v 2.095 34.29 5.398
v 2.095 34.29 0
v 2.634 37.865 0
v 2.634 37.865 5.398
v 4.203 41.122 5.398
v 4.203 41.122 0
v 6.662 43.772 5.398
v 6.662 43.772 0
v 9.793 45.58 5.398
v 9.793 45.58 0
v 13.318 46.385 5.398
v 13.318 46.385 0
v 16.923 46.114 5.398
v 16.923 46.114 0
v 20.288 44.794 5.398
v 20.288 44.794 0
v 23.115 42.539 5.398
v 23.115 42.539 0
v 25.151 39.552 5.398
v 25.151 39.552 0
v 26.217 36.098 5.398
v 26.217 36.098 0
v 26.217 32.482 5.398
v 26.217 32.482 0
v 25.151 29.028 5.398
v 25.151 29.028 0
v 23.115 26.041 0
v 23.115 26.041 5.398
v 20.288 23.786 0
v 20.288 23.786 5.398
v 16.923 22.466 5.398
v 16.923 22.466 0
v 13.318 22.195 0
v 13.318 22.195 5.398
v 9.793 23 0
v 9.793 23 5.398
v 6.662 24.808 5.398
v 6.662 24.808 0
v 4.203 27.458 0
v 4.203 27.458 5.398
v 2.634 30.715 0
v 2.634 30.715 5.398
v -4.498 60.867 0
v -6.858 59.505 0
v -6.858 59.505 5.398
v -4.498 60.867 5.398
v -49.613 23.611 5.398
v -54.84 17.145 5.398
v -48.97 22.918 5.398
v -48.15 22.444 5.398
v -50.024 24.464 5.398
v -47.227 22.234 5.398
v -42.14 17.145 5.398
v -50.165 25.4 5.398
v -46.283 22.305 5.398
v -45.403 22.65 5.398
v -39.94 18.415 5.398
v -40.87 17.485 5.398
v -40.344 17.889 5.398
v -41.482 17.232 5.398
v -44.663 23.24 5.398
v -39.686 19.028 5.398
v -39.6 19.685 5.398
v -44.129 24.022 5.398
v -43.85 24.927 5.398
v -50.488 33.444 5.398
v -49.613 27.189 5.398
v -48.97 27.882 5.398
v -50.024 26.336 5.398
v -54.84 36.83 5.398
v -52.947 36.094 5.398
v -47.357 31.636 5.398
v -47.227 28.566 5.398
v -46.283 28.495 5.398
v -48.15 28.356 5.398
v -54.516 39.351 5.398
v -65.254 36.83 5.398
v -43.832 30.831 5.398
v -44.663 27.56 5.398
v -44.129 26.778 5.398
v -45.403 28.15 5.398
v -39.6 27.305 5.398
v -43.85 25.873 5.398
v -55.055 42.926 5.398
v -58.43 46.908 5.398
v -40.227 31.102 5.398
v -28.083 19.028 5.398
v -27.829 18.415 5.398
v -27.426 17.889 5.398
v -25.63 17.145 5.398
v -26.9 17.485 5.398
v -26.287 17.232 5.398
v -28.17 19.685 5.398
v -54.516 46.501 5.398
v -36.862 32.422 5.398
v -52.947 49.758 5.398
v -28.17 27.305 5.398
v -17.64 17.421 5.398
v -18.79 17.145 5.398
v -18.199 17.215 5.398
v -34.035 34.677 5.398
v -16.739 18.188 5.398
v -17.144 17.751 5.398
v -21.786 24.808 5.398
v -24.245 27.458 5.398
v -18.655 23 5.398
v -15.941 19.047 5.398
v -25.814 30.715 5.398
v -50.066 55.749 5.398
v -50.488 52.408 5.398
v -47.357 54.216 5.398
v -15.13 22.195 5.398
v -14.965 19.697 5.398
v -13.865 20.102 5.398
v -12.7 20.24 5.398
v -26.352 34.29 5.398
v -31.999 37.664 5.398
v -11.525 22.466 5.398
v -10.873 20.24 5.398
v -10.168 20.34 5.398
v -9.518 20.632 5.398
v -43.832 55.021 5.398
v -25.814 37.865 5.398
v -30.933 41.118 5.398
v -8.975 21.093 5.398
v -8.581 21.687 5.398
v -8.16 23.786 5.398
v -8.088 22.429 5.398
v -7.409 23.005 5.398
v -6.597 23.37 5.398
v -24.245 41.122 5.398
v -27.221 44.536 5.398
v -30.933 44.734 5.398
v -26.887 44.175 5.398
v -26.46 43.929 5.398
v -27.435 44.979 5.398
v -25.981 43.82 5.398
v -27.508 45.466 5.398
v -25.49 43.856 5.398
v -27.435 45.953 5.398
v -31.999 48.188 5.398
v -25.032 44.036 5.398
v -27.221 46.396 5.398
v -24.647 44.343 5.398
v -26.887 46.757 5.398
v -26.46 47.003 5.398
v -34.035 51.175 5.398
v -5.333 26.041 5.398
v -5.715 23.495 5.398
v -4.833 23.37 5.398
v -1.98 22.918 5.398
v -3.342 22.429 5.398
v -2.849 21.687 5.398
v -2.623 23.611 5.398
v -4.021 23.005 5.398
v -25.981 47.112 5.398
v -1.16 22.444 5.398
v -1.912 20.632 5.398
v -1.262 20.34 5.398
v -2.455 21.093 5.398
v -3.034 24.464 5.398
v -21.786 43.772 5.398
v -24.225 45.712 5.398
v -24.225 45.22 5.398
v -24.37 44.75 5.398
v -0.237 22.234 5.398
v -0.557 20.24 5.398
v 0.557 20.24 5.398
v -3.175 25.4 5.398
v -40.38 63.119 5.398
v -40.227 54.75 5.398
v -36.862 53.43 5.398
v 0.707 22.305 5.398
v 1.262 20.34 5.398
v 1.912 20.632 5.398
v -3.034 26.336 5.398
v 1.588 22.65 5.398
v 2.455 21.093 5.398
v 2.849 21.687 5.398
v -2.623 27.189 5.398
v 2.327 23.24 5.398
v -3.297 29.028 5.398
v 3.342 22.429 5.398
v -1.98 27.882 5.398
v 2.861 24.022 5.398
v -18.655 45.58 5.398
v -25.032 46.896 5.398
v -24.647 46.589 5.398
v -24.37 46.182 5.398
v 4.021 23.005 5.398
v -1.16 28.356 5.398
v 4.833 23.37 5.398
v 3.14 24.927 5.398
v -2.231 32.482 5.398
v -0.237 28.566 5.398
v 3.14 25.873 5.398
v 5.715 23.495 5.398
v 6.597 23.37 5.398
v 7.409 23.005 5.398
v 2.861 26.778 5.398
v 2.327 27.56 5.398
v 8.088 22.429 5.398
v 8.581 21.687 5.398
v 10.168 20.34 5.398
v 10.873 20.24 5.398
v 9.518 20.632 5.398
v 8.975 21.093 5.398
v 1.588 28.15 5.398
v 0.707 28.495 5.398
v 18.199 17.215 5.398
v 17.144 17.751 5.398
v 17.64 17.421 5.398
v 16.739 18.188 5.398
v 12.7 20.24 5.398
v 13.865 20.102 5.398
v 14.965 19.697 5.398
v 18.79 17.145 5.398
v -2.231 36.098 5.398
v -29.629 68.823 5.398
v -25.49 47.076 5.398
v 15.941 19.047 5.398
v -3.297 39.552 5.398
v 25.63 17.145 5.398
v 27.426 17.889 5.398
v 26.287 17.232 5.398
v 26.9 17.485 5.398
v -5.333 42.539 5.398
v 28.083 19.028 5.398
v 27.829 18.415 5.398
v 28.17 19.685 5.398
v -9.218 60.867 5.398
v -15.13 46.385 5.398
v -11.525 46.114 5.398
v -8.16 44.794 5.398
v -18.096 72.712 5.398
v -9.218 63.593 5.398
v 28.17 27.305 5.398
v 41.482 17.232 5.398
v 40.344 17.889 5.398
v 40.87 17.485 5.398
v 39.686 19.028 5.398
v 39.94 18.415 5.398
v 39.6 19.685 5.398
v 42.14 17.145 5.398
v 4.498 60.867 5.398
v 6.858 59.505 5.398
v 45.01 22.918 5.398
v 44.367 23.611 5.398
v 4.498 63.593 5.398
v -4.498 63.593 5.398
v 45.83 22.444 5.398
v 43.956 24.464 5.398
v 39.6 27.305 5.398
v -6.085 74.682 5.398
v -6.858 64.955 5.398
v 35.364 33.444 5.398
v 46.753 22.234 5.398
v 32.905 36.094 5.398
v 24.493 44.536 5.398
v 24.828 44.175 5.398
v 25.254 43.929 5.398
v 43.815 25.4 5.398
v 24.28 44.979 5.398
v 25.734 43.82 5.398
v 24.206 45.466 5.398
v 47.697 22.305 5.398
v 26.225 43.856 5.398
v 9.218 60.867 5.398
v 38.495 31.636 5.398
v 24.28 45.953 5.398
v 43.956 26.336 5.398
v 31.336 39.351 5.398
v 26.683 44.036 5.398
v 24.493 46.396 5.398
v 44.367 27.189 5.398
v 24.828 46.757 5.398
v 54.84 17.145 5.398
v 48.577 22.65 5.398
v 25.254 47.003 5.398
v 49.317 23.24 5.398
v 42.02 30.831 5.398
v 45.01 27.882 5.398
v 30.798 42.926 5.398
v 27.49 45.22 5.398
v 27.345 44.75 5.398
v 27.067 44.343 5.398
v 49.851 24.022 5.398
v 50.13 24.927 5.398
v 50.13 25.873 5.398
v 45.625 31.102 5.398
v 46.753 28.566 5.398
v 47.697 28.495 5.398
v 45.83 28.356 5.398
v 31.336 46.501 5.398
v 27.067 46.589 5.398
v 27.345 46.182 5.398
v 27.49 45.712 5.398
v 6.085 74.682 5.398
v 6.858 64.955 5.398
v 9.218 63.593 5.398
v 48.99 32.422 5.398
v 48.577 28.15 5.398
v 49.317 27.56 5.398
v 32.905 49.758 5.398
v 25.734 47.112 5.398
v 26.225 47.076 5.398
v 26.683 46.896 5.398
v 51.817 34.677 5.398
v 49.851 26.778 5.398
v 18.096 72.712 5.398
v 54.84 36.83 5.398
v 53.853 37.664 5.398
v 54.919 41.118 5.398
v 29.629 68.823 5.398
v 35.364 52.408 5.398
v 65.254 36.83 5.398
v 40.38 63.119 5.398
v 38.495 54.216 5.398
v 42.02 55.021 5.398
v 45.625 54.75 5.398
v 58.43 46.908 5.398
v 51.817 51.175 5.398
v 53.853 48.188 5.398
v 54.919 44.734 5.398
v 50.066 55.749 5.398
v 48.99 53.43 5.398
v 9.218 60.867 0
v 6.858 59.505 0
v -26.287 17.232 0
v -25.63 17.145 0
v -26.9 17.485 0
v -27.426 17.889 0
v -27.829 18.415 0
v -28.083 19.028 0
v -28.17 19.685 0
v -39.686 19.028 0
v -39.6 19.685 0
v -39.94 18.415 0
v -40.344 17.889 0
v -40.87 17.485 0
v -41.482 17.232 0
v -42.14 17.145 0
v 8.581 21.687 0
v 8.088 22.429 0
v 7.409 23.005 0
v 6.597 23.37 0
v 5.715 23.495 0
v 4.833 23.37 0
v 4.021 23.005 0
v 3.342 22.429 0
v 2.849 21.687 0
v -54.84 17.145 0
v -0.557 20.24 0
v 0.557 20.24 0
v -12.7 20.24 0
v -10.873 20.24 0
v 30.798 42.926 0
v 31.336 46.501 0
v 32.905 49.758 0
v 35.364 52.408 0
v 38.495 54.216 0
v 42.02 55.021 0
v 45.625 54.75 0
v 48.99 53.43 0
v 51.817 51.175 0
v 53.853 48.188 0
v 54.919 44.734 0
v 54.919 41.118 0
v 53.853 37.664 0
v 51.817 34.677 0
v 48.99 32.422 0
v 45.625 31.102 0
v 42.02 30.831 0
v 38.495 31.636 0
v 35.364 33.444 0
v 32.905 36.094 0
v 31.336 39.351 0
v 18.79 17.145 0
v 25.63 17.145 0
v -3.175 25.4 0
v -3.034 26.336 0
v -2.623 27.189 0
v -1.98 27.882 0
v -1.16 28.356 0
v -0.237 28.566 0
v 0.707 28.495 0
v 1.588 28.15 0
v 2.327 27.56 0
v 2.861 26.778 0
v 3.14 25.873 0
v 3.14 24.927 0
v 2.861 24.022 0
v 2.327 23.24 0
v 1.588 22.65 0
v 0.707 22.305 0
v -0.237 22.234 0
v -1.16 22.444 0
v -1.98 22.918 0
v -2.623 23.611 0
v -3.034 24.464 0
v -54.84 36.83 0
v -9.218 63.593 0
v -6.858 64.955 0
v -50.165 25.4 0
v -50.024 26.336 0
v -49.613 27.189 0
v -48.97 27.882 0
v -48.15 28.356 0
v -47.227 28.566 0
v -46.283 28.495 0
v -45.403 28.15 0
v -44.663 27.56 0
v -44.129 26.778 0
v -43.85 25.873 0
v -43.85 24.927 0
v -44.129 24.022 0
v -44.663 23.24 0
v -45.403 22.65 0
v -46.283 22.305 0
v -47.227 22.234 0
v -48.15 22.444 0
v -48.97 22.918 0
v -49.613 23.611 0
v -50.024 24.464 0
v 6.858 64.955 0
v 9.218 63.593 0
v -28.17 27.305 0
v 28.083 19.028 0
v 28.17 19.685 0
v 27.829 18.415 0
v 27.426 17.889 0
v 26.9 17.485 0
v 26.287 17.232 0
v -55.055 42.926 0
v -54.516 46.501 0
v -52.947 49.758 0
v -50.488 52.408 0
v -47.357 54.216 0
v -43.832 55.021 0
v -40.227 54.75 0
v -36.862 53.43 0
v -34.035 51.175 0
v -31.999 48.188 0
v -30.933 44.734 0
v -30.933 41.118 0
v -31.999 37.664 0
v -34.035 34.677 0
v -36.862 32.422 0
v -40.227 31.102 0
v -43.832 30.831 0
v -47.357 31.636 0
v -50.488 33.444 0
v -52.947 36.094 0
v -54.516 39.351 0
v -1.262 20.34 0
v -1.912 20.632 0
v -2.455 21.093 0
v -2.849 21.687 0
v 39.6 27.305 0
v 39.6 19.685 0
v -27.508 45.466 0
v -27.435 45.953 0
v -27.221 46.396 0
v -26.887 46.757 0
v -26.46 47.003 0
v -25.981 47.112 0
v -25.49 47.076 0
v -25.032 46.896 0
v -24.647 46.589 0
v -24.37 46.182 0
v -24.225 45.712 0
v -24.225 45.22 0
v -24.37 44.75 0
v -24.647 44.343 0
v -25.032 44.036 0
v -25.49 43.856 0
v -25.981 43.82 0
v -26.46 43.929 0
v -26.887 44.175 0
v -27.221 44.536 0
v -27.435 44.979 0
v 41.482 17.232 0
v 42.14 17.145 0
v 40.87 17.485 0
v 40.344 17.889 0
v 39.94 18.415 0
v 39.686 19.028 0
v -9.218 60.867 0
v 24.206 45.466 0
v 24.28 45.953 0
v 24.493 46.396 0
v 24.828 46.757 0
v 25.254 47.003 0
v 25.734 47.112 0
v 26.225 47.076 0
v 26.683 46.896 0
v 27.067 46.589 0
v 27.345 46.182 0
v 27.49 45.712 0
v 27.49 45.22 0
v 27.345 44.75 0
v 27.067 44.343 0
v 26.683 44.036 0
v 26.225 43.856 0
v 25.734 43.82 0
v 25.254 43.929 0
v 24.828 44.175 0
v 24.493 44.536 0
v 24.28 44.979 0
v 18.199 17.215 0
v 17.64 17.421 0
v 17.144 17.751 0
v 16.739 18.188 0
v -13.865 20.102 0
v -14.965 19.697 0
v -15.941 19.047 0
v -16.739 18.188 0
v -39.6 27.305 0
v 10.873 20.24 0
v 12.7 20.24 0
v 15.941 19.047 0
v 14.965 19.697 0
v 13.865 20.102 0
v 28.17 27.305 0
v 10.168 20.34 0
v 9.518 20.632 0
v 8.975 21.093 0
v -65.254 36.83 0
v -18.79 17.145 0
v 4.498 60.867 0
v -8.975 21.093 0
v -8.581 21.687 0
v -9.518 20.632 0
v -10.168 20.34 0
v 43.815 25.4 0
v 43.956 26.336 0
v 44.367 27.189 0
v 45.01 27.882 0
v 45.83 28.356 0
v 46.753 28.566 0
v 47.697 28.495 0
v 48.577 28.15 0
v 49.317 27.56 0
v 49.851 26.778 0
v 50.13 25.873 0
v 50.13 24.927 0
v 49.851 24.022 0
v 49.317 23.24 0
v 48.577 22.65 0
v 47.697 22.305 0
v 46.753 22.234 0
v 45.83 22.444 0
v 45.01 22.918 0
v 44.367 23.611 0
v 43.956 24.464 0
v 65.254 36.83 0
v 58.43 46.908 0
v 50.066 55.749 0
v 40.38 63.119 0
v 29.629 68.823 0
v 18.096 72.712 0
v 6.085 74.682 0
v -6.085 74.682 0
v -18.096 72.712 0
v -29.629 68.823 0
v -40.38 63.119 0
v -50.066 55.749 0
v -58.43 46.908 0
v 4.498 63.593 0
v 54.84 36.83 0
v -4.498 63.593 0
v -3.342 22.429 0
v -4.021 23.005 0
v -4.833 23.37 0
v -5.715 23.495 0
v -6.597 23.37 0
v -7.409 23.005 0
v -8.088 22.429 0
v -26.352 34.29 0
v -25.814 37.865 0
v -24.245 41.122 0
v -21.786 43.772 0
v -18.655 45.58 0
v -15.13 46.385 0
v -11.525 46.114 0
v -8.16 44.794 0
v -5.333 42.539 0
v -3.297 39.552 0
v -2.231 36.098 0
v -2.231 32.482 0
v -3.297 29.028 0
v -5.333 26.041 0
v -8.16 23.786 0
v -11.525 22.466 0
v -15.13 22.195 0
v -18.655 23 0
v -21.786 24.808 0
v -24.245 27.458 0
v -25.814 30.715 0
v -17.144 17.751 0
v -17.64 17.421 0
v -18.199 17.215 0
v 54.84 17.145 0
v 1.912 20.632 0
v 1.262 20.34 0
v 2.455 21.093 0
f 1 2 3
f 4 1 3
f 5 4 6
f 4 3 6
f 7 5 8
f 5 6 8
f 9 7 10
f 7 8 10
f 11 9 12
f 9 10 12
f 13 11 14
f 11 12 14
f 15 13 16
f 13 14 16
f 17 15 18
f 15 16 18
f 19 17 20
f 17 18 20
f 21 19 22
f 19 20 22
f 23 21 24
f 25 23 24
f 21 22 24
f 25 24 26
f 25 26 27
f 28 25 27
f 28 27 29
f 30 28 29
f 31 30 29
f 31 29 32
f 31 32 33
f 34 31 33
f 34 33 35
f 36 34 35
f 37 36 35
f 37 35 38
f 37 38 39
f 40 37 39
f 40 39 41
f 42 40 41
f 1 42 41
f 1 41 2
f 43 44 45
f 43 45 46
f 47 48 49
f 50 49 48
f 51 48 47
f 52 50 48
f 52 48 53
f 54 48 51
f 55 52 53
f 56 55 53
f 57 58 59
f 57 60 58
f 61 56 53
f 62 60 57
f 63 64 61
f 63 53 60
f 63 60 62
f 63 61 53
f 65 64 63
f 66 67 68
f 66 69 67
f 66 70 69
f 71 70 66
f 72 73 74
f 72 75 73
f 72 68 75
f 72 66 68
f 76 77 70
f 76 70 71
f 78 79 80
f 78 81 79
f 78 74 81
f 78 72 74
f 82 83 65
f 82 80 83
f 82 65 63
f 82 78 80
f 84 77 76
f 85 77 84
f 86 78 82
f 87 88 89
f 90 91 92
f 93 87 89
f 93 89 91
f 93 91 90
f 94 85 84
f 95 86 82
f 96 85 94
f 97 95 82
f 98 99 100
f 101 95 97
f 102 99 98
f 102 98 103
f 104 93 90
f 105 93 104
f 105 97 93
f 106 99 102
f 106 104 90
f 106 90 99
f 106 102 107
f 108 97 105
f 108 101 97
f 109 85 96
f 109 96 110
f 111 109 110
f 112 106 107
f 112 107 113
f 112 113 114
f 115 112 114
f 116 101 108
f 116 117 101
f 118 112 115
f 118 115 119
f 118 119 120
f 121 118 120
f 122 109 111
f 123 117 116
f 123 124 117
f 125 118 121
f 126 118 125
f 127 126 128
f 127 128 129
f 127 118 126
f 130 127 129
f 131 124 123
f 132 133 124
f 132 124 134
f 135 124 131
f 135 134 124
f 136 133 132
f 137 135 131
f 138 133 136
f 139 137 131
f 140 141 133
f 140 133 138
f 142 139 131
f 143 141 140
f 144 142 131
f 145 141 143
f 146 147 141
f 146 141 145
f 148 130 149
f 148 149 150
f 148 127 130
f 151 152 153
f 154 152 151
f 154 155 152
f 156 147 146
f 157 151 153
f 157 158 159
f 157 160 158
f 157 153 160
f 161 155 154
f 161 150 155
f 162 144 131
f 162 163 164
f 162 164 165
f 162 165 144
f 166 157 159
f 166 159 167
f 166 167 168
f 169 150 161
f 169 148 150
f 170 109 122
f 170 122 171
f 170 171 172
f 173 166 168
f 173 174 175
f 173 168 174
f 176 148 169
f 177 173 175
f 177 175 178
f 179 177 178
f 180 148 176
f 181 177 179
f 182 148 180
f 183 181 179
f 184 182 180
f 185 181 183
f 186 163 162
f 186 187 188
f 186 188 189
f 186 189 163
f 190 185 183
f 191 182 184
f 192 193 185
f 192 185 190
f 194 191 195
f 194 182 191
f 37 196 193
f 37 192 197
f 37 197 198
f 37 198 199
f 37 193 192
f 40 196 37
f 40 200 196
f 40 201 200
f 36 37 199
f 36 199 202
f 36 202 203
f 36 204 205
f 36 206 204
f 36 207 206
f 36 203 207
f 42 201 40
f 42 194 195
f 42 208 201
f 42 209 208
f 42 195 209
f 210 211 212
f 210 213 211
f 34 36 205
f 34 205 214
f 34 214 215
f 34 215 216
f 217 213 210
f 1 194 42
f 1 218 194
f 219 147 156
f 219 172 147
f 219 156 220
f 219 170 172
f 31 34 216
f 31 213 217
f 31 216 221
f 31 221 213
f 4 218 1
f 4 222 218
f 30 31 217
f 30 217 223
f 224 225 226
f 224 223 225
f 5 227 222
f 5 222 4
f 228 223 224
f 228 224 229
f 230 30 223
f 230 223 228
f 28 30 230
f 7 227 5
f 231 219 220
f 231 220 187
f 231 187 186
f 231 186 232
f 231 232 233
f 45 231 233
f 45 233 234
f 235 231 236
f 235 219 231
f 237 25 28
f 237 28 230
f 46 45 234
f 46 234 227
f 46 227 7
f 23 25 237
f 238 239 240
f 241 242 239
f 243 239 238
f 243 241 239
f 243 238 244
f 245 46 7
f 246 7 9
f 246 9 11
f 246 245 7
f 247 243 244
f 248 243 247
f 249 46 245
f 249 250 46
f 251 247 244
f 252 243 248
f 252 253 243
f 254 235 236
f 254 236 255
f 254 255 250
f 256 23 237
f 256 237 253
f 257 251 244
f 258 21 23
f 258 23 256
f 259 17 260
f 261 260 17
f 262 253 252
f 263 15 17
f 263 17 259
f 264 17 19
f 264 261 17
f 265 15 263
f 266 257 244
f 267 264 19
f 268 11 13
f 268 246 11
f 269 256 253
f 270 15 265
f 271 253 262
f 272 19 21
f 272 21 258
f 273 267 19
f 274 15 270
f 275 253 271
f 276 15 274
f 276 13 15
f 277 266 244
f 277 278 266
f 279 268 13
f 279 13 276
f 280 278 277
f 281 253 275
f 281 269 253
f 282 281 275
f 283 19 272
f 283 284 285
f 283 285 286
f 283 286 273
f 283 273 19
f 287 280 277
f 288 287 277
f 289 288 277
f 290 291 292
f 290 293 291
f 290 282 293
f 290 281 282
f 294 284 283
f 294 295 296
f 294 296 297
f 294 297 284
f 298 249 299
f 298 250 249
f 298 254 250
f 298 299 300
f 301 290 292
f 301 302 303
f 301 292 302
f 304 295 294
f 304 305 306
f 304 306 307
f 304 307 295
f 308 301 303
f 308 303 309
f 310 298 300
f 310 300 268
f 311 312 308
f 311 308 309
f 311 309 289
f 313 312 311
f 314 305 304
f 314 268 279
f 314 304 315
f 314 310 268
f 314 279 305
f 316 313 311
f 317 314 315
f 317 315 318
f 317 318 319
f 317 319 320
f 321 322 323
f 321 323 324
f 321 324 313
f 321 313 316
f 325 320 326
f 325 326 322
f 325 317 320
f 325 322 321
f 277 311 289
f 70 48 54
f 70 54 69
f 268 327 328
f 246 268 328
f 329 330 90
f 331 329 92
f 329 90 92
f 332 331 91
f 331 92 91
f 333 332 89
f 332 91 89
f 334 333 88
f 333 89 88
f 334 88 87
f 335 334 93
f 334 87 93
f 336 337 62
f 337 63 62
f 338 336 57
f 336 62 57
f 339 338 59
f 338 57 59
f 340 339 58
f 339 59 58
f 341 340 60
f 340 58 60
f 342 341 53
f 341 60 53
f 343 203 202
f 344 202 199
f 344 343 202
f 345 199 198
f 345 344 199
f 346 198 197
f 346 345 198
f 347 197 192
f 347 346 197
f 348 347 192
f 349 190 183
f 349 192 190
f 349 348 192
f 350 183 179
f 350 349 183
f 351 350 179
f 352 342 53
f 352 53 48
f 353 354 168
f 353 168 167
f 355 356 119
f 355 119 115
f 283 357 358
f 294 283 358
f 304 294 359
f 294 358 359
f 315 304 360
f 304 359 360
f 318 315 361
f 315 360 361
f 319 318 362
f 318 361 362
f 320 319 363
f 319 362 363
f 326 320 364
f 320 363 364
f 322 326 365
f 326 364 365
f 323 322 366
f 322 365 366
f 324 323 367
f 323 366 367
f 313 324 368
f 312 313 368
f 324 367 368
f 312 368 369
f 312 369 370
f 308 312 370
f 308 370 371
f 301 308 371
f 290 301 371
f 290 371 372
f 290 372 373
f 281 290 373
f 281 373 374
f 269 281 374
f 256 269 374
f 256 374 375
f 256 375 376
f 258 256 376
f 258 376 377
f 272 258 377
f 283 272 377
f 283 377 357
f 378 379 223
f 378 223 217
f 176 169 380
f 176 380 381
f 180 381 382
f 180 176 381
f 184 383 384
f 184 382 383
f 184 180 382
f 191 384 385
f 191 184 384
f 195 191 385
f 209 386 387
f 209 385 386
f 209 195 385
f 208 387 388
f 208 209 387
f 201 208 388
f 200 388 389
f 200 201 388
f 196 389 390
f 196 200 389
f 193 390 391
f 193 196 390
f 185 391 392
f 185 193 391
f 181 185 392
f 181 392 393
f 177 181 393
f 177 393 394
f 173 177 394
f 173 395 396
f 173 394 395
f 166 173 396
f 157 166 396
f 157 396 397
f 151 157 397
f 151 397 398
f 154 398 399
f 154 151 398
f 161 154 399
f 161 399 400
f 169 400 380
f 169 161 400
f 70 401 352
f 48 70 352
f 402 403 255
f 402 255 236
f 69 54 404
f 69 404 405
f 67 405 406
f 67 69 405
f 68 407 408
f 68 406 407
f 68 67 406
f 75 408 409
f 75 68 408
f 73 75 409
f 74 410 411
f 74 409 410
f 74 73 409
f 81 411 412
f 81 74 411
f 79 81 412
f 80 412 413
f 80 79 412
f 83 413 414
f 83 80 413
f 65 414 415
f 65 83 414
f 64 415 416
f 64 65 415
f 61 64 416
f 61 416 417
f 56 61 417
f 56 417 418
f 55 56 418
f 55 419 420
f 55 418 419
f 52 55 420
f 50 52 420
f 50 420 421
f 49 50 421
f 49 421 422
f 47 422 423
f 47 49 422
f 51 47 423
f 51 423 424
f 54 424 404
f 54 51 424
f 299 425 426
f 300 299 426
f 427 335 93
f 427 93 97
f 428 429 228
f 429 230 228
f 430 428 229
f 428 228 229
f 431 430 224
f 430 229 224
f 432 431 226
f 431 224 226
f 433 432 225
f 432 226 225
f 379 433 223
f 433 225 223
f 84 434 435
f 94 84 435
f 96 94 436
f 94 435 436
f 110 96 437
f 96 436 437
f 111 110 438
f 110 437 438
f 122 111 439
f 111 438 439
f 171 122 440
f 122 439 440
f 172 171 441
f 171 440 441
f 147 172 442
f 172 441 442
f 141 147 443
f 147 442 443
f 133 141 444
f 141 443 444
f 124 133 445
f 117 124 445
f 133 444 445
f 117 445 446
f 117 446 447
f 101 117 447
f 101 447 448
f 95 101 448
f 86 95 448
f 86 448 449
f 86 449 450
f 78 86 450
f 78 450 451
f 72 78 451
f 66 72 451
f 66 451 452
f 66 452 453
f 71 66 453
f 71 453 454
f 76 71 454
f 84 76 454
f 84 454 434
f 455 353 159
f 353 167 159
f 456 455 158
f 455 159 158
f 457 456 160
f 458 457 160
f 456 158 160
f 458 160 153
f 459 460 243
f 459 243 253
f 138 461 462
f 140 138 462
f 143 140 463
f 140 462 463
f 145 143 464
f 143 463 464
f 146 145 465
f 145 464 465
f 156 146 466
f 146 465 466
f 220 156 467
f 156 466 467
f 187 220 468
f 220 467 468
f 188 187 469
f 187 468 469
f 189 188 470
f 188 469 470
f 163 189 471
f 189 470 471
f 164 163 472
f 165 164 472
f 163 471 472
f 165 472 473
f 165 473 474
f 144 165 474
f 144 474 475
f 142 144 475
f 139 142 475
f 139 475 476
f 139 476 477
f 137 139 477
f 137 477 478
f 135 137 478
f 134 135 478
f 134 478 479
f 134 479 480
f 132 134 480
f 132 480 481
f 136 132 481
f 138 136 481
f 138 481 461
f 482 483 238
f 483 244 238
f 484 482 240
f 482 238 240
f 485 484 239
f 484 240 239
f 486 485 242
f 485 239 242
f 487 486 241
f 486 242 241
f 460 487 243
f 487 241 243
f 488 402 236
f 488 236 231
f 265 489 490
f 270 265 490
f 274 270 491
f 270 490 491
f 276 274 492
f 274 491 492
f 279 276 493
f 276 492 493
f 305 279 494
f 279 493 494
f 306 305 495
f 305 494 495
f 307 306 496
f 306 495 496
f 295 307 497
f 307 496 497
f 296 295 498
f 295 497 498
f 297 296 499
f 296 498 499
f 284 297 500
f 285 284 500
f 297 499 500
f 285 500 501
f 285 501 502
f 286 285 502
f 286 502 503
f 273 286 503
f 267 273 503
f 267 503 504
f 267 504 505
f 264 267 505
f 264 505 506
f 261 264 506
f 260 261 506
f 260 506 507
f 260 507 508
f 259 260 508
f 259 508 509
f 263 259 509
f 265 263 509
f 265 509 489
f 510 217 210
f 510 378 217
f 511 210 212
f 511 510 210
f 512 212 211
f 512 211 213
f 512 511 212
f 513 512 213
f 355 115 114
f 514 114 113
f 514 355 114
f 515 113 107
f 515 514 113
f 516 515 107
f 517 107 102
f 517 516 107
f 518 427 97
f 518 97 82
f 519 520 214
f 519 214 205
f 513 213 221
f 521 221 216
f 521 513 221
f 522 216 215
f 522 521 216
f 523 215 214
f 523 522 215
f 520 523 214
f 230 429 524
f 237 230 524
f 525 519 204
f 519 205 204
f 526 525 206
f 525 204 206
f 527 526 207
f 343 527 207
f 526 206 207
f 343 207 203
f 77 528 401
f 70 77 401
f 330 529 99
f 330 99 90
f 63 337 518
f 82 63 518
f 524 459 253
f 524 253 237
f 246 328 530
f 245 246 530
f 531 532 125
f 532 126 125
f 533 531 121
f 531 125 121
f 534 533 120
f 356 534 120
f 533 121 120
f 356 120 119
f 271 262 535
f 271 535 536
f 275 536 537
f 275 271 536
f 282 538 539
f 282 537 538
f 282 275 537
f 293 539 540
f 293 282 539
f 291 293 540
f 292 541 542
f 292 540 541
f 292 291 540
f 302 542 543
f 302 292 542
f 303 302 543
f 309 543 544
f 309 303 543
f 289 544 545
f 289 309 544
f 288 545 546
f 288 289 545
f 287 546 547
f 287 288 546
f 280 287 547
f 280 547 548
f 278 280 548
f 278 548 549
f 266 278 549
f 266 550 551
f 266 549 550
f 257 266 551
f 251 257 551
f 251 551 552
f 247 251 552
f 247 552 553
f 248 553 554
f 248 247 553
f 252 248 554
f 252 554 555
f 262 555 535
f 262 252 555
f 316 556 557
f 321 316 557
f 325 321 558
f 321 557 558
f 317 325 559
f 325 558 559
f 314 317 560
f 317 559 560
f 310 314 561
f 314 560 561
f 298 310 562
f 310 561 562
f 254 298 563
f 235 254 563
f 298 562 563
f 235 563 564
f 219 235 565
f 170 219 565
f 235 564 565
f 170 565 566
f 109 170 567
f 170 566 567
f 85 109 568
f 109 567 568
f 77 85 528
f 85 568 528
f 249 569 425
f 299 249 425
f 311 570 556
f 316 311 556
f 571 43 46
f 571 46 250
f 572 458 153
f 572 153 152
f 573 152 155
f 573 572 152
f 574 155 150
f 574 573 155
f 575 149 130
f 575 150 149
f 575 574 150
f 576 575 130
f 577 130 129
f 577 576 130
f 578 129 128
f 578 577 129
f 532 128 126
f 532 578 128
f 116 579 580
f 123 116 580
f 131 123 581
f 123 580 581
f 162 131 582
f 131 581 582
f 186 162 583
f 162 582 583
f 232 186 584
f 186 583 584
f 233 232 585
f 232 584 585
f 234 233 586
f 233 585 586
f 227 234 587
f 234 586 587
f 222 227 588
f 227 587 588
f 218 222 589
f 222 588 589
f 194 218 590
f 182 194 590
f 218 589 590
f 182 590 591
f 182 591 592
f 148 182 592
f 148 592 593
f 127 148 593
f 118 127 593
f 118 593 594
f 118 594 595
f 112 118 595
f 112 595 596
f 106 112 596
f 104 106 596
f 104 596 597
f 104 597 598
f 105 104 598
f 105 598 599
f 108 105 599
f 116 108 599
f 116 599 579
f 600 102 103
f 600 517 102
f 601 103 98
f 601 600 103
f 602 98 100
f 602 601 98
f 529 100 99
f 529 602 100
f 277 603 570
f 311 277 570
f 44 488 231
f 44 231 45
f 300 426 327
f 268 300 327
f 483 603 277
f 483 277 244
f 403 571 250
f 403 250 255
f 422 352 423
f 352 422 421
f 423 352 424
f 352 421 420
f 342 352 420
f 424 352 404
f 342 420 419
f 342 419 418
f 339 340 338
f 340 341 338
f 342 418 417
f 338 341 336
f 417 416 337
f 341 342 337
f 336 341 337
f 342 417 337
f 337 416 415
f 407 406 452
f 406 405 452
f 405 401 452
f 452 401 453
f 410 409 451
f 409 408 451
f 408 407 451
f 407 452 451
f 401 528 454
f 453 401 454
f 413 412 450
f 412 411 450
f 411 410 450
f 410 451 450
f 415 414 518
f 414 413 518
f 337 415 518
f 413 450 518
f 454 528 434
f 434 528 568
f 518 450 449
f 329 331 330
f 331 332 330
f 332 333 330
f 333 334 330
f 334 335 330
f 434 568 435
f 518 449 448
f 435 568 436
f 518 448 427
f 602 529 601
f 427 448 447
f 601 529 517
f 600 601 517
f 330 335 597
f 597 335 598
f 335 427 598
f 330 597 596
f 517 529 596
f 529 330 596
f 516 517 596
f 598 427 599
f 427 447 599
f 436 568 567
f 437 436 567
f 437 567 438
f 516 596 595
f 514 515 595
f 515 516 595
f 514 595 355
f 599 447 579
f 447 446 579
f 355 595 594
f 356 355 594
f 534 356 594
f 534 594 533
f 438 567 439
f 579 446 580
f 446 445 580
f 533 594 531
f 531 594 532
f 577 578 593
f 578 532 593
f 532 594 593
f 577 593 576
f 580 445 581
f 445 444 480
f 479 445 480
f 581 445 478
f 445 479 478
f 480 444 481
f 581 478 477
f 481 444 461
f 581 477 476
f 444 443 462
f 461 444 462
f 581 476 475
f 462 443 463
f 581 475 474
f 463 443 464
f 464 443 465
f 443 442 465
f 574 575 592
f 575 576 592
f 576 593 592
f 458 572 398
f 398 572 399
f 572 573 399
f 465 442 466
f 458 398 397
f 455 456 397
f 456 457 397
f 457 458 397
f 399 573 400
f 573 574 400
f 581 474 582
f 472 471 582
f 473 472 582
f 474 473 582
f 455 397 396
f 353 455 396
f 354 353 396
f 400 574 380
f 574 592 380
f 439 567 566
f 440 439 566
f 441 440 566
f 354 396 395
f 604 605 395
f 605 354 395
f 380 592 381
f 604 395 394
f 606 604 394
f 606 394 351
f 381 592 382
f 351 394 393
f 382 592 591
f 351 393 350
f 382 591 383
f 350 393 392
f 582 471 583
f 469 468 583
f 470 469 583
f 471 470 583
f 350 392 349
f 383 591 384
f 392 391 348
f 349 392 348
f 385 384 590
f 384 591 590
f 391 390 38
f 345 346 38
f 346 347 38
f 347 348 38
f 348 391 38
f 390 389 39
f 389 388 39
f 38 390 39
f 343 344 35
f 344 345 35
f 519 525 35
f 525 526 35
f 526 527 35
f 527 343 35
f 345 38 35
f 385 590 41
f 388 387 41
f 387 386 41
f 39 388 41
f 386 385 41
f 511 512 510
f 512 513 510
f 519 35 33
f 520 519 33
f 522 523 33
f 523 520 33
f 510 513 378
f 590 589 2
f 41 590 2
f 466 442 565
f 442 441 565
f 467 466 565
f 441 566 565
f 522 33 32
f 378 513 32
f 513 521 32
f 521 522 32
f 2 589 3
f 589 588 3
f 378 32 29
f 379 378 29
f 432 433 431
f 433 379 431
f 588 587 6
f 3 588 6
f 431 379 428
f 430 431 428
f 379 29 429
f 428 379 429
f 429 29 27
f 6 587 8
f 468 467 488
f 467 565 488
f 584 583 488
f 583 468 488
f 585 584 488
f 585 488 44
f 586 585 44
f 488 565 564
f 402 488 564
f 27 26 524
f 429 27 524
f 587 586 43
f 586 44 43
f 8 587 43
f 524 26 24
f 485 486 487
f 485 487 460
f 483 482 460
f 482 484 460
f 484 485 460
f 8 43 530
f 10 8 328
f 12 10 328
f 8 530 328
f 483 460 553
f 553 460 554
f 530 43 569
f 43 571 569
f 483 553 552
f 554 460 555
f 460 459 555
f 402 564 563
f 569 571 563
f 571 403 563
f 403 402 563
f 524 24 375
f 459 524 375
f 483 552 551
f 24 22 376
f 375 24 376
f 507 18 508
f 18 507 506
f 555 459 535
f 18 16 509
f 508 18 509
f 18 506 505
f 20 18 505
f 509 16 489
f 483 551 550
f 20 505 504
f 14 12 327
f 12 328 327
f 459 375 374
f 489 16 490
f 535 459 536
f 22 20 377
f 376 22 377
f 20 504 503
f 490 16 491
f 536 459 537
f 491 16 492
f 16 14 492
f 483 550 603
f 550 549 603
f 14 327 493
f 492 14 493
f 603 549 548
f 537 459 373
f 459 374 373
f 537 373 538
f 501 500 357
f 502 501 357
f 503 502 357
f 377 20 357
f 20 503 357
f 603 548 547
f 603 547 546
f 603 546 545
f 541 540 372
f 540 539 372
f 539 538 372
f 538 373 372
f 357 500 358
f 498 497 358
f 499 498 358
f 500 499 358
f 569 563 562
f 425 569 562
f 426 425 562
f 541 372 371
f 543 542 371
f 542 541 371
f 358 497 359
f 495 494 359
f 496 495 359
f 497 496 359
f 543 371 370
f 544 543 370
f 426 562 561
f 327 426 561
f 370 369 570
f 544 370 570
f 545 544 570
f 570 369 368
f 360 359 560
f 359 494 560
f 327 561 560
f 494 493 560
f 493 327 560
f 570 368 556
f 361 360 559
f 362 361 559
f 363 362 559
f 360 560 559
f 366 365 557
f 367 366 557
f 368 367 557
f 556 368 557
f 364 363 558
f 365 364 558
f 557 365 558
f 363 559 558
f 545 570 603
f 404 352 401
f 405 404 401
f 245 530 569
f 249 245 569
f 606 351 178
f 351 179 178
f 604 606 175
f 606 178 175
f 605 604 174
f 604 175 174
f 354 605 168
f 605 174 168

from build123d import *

# Parameters (mm, degrees)
SKETCH1_R                 = 1.651
BOSS_EXTRUDE2_DEPTH       = 5.3975
SKETCH2_R                 = 1.143
CUT_EXTRUDE1_DEPTH        = 6.3975
SKETCH3_R                 = 12.1285
CUT_EXTRUDE2_DEPTH        = 6.3975
SKETCH4_W                 = 28.562713242
SKETCH4_H                 = 11.677503754
BOSS_EXTRUDE3_DEPTH       = 5.3975
SKETCH5_W                 = 230.699333954
SKETCH5_H                 = 107.587024537
CUT_EXTRUDE3_DEPTH        = 6.3975
CUT_EXTRUDE4_DEPTH        = 6.3975
SKETCH156_W               = 11.43
SKETCH156_H               = 10.16
CUT_EXTRUDE152_DEPTH      = 6.3975
SKETCH164_R               = 1.651
CUT_EXTRUDE160_DEPTH      = 21.59
SKETCH218_R               = 3.175
CUT_EXTRUDE214_DEPTH      = 103.378
CUT_EXTRUDE214_DEPTH_BACK = 48.768
CUT_EXTRUDE155_DEPTH      = 34.544
FILLET1_R                 = 2.54


with BuildPart() as part:
    # Sketch1 → Boss-Extrude2 (new body)
    with BuildSketch(Plane.XY):
        with BuildLine():
            Line((-65.2537815, 36.83), (-54.8397815, 36.83))
            Line((-54.8397815, 36.83), (-54.8397815, -36.83))
            Line((-54.8397815, -36.83), (-65.2537815, -36.83))
            ThreePointArc((-65.2537815, -36.83), (0, -74.93), (65.2537815, -36.83))
            Line((65.2537815, -36.83), (54.8397815, -36.83))
            Line((54.8397815, -36.83), (54.8397815, 36.83))
            Line((54.8397815, 36.83), (65.2537815, 36.83))
            ThreePointArc((65.2537815, 36.83), (0, 74.93), (-65.2537815, 36.83))
        make_face()
        with Locations((-45.466, 11.049)):
            Circle(SKETCH1_R, mode=Mode.SUBTRACT)
        with Locations((-20.067270032, 10.795)):
            Circle(SKETCH1_R, mode=Mode.SUBTRACT)
        with Locations((-20.067270032, -10.795)):
            Circle(SKETCH1_R, mode=Mode.SUBTRACT)
        with Locations((-45.466, -11.049)):
            Circle(SKETCH1_R, mode=Mode.SUBTRACT)
        with Locations((45.466, -11.049)):
            Circle(SKETCH1_R, mode=Mode.SUBTRACT)
        with Locations((20.067270032, -10.795)):
            Circle(SKETCH1_R, mode=Mode.SUBTRACT)
        with Locations((20.067270032, 10.795)):
            Circle(SKETCH1_R, mode=Mode.SUBTRACT)
        with Locations((45.466, 11.049)):
            Circle(SKETCH1_R, mode=Mode.SUBTRACT)
    extrude(amount=BOSS_EXTRUDE2_DEPTH)

    # Sketch2 → Cut-Extrude1 (cut, through all)
    with BuildSketch(Plane.XY.offset(5.3975)):
        with Locations((-6.731, 62.23)):
            Circle(SKETCH2_R)
        with Locations((6.731, 62.23)):
            Circle(SKETCH2_R)
    extrude(amount=-CUT_EXTRUDE1_DEPTH, mode=Mode.SUBTRACT)

    # Sketch3 → Cut-Extrude2 (cut, through all)
    with BuildSketch(Plane(origin=(0, 0, 0), x_dir=(-1, 0, 0), z_dir=(0, 0, -1))):
        with Locations((-42.926, -42.926)):
            Circle(SKETCH3_R)
        with Locations((14.224, -34.29)):
            Circle(SKETCH3_R)
        with Locations((14.224, 34.29)):
            Circle(SKETCH3_R)
        with Locations((-42.926, 42.926)):
            Circle(SKETCH3_R)
        with Locations((42.926, 42.926)):
            Circle(SKETCH3_R)
        with Locations((-14.224, 34.29)):
            Circle(SKETCH3_R)
        with Locations((-14.224, -34.29)):
            Circle(SKETCH3_R)
        with Locations((42.926, -42.926)):
            Circle(SKETCH3_R)
    extrude(amount=-CUT_EXTRUDE2_DEPTH, mode=Mode.SUBTRACT)

    # Sketch4 → Boss-Extrude3 (add)
    with BuildSketch(Plane(origin=(0, 0, 0), x_dir=(-1, 0, 0), z_dir=(0, 0, -1))):
        with Locations((-1.488809975, 62.152540216)):
            Rectangle(SKETCH4_W, SKETCH4_H)
    extrude(amount=-BOSS_EXTRUDE3_DEPTH)

    # Sketch5 → Cut-Extrude3 (cut, through all)
    with BuildSketch(Plane(origin=(0, 0, 0), x_dir=(-1, 0, 0), z_dir=(0, 0, -1))):
        with Locations((1.971047261, -36.648512269)):
            Rectangle(SKETCH5_W, SKETCH5_H)
    extrude(amount=-CUT_EXTRUDE3_DEPTH, mode=Mode.SUBTRACT)

    # Sketch6 → Cut-Extrude4 (cut, through all)
    with BuildSketch(Plane(origin=(0, 0, 0), x_dir=(-1, 0, 0), z_dir=(0, 0, -1))):
        Polygon((4.498, 63.592546635), (6.858, 64.955093271), (9.218, 63.592546635), (9.218, 60.867453365), (6.858, 59.504906729), (4.498, 60.867453365), align=None)
        Polygon((-6.858, 64.955093271), (-9.218, 63.592546635), (-9.218, 60.867453365), (-6.858, 59.504906729), (-4.498, 60.867453365), (-4.498, 63.592546635), align=None)
    extrude(amount=-CUT_EXTRUDE4_DEPTH, mode=Mode.SUBTRACT)

    # Sketch156 → Cut-Extrude152 (cut, through all)
    with BuildSketch(Plane(origin=(0, 0, 0), x_dir=(-1, 0, 0), z_dir=(0, 0, -1))):
        with Locations((33.8847815, 22.225)):
            Rectangle(SKETCH156_W, SKETCH156_H)
        with Locations((-33.8847815, 22.225)):
            Rectangle(SKETCH156_W, SKETCH156_H)
    extrude(amount=-CUT_EXTRUDE152_DEPTH, mode=Mode.SUBTRACT)

    # Sketch164 → Cut-Extrude160 (cut)
    with BuildSketch(Plane(origin=(0, 0, 0), x_dir=(-1, 0, 0), z_dir=(0, 0, -1))):
        with Locations((25.8572, 45.466)):
            Circle(SKETCH164_R)
        with Locations((-25.8572, 45.466)):
            Circle(SKETCH164_R)
    extrude(amount=-CUT_EXTRUDE160_DEPTH, mode=Mode.SUBTRACT)

    # Sketch218 → Cut-Extrude214 (cut, two sides)
    with BuildSketch(Plane(origin=(30.092005081, 4.08352975, 11.4935), x_dir=(-1, 0, 0), z_dir=(0, 0, -1))) as cut_extrude214_sk:
        with Locations((-16.897994919, 21.31647025)):
            Circle(SKETCH218_R)
        with Locations((77.082005081, 21.31647025)):
            Circle(SKETCH218_R)
        with Locations((30.092005081, 21.31647025)):
            Circle(SKETCH218_R)
    extrude(amount=CUT_EXTRUDE214_DEPTH, mode=Mode.SUBTRACT)
    extrude(cut_extrude214_sk.sketch, amount=-CUT_EXTRUDE214_DEPTH_BACK, mode=Mode.SUBTRACT)

    # Sketch159 → Cut-Extrude155 (cut)
    with BuildSketch(Plane(origin=(0, 0, 0), x_dir=(-1, 0, 0), z_dir=(0, 0, -1))):
        with BuildLine():
            Line((-12.7, 20.24), (-8.888991966, 20.24))
            ThreePointArc((-8.888991966, 20.24), (-5.715, 23.495), (-2.541008034, 20.24))
            Line((-2.541008034, 20.24), (2.541008034, 20.24))
            ThreePointArc((2.541008034, 20.24), (5.715, 23.495), (8.888991966, 20.24))
            Line((8.888991966, 20.24), (12.7, 20.24))
            ThreePointArc((12.7, 20.24), (17.7, 15.24), (12.7, 10.24))
            Line((12.7, 10.24), (-12.7, 10.24))
            ThreePointArc((-12.7, 10.24), (-17.7, 15.24), (-12.7, 20.24))
        make_face()
    extrude(amount=-CUT_EXTRUDE155_DEPTH, mode=Mode.SUBTRACT)

    # Fillet1
    fillet1_edges = [part.edges().sort_by_distance(p)[0] for p in [
        (-39.5997815, 17.145, 2.69875),
        (-28.1697815, 17.145, 2.69875),
        (28.1697815, 17.145, 2.69875),
        (39.5997815, 17.145, 2.69875),
        (17.322875188, 17.145, 2.69875),
        (-17.322875188, 17.145, 2.69875),
        (8.888991966, 20.24, 2.69875),
        (2.541008034, 20.24, 2.69875),
        (-2.541008034, 20.24, 2.69875),
        (-8.888991966, 20.24, 2.69875),
    ]]
    fillet(fillet1_edges, radius=FILLET1_R)


solid = part.part
